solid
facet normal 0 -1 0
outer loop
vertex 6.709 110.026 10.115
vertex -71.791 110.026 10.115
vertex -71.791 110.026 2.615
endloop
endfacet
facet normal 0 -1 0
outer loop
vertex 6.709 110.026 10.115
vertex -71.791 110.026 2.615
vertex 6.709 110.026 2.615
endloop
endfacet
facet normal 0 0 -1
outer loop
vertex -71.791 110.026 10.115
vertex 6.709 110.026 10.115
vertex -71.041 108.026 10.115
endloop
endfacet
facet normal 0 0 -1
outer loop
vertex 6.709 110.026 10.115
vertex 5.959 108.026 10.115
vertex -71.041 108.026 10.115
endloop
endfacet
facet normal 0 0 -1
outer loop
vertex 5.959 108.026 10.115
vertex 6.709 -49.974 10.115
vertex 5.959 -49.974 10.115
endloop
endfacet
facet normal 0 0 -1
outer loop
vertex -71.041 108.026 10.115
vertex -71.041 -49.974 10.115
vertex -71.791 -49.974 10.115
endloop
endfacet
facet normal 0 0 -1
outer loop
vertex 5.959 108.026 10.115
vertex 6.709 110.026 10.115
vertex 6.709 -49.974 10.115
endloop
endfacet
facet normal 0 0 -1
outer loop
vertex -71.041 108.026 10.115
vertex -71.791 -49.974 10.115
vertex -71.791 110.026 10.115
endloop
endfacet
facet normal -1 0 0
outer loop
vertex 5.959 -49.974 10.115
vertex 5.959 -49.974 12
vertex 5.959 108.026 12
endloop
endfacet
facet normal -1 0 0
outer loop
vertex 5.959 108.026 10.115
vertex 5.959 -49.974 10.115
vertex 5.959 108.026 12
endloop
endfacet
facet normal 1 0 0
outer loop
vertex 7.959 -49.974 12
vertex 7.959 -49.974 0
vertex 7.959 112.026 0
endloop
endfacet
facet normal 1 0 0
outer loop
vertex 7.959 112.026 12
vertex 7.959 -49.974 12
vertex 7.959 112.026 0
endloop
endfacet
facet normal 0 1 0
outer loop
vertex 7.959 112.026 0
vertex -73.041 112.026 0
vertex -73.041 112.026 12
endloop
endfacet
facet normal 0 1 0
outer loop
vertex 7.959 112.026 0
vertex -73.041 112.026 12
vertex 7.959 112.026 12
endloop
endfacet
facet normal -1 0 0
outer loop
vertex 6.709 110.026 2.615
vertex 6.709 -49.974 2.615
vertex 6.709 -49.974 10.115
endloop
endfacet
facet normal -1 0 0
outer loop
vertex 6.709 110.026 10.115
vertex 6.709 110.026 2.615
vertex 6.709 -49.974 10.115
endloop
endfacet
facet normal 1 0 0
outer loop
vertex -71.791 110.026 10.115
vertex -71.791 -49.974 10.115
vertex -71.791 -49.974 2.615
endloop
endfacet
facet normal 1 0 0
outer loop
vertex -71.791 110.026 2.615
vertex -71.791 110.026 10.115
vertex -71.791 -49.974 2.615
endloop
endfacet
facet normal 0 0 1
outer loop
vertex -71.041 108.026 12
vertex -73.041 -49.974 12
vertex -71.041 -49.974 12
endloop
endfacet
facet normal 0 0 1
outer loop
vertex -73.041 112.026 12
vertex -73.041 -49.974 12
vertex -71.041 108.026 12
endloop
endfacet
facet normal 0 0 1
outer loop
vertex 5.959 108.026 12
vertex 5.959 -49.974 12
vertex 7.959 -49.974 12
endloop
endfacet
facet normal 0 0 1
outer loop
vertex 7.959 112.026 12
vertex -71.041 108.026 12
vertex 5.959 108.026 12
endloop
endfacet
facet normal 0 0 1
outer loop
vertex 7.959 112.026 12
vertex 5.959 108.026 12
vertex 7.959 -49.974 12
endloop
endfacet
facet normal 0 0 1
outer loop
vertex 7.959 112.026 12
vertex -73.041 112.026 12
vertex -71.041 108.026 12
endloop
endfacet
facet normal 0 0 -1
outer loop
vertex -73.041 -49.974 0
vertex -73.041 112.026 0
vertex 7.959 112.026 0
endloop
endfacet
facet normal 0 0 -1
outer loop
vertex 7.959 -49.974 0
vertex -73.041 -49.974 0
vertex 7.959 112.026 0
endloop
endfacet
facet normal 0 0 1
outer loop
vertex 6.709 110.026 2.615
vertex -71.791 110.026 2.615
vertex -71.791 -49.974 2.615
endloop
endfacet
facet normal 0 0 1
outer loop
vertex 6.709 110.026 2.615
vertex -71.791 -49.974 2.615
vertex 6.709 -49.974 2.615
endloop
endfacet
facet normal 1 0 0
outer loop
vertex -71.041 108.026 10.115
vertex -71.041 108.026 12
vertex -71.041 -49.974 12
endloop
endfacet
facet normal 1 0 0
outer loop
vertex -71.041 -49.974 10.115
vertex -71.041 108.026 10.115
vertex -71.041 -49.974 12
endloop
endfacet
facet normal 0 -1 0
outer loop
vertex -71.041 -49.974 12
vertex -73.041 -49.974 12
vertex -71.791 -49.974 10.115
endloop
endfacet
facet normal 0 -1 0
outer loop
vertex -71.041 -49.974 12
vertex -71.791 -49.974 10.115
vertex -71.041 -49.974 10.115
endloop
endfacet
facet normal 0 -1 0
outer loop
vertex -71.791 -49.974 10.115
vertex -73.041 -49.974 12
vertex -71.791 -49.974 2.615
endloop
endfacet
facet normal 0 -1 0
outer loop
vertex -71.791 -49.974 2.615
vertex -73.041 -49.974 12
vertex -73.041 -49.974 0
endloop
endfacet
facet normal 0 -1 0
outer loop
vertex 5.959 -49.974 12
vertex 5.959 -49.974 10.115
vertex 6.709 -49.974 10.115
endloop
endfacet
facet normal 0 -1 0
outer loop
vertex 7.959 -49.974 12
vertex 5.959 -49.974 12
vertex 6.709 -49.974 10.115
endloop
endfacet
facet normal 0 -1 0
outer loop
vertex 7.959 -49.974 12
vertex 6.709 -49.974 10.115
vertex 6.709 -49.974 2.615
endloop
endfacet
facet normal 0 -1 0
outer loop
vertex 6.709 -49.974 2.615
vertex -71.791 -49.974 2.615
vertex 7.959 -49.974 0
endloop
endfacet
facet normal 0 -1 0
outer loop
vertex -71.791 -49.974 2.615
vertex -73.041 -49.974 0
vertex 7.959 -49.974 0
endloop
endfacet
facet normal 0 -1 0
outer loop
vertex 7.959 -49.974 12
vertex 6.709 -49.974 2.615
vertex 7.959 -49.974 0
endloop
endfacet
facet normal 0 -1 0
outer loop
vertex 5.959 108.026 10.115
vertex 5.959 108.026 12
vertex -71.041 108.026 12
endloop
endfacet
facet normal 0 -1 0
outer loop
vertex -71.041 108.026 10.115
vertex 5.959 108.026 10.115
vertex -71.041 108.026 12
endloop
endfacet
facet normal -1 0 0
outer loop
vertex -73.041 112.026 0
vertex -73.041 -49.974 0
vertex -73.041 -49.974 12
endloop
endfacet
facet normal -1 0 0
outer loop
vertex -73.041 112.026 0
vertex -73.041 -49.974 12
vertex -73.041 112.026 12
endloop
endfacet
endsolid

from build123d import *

# Parameters (mm, degrees)
F0_W     = 81
F0_H     = 162
F1_DEPTH = 12
F3_DEPTH = 160
F5_DEPTH = 7.431314


with BuildPart() as f1:
    # F0 (on Top) → F1 (new body)
    with BuildSketch(Plane.XY):
        with Locations((-32.540516, 31.026223)):
            Rectangle(F0_W, F0_H)
    extrude(amount=F1_DEPTH)

    # F2 (on face) → F3 (cut)
    with BuildSketch(Plane.XZ.offset(49.973777)):
        Polygon((6.709484, 7.660007), (6.709484, 10.115228), (-71.790516, 10.115228), (-71.790516, 7.937757), (-71.790516, 2.615228), (6.709484, 2.615228), align=None)
    extrude(amount=-F3_DEPTH, mode=Mode.SUBTRACT)

    # F4 (on face) → F5 (cut)
    with BuildSketch(Plane.XY.offset(12)):
        Polygon((5.959484, 108.026223), (-71.040516, 108.026223), (-71.040516, -44.254787), (-71.040516, -49.973777), (5.959484, -49.973777), (5.959484, -43.884151), align=None)
    extrude(amount=-F5_DEPTH, mode=Mode.SUBTRACT)


solid = f1.part
